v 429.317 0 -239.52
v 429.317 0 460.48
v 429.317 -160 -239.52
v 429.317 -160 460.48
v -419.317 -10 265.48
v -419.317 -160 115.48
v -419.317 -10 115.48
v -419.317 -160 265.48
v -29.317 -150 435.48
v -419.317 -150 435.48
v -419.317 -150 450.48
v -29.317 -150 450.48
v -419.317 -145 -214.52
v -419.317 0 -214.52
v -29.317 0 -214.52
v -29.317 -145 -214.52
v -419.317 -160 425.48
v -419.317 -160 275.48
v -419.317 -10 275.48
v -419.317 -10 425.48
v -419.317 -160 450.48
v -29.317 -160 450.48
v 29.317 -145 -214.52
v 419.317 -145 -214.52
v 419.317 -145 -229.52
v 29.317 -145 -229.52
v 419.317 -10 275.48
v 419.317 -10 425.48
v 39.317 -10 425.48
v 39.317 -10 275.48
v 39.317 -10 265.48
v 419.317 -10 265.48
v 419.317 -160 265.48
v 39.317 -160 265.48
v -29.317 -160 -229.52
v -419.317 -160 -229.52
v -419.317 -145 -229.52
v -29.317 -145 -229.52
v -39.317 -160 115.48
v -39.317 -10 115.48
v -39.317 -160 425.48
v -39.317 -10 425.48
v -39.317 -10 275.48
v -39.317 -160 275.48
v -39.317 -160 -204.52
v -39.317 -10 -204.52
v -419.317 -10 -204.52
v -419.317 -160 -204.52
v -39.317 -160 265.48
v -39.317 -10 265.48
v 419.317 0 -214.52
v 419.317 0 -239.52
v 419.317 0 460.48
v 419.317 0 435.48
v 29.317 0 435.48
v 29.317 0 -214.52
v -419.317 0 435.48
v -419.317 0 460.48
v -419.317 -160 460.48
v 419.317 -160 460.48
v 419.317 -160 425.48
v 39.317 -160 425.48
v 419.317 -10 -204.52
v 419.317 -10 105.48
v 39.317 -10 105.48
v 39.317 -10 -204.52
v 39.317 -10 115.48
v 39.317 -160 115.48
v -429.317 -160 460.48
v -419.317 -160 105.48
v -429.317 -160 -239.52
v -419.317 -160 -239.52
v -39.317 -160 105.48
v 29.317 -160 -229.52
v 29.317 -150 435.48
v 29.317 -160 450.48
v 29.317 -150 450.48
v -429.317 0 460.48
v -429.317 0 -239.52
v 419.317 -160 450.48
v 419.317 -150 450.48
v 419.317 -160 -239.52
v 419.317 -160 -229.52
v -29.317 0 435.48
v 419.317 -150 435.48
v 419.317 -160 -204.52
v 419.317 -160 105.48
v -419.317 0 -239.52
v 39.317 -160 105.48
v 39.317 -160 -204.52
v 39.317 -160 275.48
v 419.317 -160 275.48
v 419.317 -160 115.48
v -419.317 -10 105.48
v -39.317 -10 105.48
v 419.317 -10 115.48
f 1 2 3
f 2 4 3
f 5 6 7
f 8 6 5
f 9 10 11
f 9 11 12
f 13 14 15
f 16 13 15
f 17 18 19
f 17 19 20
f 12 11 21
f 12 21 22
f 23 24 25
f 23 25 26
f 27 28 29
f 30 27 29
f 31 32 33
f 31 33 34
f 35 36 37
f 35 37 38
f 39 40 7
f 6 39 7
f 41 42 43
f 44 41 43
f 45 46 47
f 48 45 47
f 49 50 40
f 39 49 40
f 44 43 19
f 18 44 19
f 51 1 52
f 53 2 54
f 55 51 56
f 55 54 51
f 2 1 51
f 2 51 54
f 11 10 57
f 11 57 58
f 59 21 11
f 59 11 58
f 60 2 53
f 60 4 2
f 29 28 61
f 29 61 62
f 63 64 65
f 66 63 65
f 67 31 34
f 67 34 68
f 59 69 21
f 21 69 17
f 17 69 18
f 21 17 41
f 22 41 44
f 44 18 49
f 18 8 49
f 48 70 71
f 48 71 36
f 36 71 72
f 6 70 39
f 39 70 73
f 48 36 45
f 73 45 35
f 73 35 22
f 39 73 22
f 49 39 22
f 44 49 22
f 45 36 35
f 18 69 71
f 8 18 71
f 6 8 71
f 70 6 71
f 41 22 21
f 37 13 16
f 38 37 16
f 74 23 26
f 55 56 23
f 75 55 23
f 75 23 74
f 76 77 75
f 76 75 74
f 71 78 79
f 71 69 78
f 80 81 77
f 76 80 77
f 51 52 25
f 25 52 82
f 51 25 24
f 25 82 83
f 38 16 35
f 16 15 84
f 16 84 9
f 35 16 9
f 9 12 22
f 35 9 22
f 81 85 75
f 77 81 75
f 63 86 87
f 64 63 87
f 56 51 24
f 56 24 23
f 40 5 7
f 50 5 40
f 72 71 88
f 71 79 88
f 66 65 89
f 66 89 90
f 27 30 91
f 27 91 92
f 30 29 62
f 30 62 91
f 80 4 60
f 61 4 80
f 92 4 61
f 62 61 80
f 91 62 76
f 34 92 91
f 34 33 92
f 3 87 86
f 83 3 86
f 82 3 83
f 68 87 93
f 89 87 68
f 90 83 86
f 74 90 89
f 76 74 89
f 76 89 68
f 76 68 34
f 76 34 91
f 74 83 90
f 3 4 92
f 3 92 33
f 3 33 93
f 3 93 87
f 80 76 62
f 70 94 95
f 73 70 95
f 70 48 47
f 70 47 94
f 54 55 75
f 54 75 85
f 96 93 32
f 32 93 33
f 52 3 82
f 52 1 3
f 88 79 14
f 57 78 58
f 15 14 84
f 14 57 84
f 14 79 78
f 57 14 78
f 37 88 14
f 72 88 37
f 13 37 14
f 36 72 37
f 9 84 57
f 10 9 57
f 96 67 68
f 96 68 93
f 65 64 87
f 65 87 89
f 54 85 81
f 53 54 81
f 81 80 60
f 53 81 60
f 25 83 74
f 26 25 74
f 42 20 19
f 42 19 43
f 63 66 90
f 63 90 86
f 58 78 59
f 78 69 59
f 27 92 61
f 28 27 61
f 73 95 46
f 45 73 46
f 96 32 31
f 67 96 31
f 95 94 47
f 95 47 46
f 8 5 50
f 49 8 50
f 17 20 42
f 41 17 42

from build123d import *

# Parameters (mm, degrees)
F0_W          = 400
F0_H          = 650
F1_DEPTH      = 10
F2_W          = 10
F2_H          = 25
F2_H_2        = 650
F3_DEPTH      = 150
F3_DEPTH_BACK = 10
F5_DEPTH      = 150
F6_W          = 390
F6_H          = 10
F7_DEPTH      = 15
F8_W          = 390
F8_H          = 15
F9_DEPTH      = 15


with BuildPart() as f1:
    # F0 (on Front) → F1 (new body)
    with BuildSketch(Plane.XZ):
        with Locations((-229.316539192, 110.4799643159)):
            Rectangle(F0_W, F0_H)
    extrude(amount=F1_DEPTH)

    # F2 (on face) → F3 (join, two sides)
    with BuildSketch(Plane.XZ.offset(10)) as f3_sk:
        with Locations((-424.316539192, 447.9799643159)):
            Rectangle(F2_W, F2_H)
        with Locations((-424.316539192, 110.4799643159)):
            Rectangle(F2_W, F2_H_2)
        with Locations((-424.316539192, -227.0200356841)):
            Rectangle(F2_W, F2_H)
    extrude(amount=F3_DEPTH)
    extrude(f3_sk.sketch, amount=-F3_DEPTH_BACK)

    # F4 (on face) → F5 (join)
    with BuildSketch(Plane.XZ.offset(10)):
        Polygon((-419.316539192, 435.4799643159), (-419.316539192, 425.4799643159), (-39.3165391921, 425.4799643159), (-39.316539192, 275.4799643159), (-419.316539192, 275.4799643159), (-419.316539192, 265.4799643159), (-39.3165391921, 265.4799643159), (-39.3165391921, 115.4799643159), (-419.316539192, 115.4799643159), (-419.316539192, 105.4799643159), (-39.316539192, 105.4799643159), (-39.316539192, -204.5200356841), (-419.316539192, -204.5200356841), (-419.316539192, -214.5200356841), (-29.316539192, -214.5200356841), (-29.316539192, 435.4799643159), align=None)
    extrude(amount=F5_DEPTH)

    # F6 (on face) → F7 (join)
    with BuildSketch(Plane.XY.offset(435.4799643159)):
        with Locations((-224.316539192, -155)):
            Rectangle(F6_W, F6_H)
    extrude(amount=F7_DEPTH)

    # F8 (on face) → F9 (join)
    with BuildSketch(Plane(origin=(0, 0, -214.5200356841), x_dir=(1, 0, 0), z_dir=(0, 0, -1))):
        with Locations((-224.316539192, 152.5)):
            Rectangle(F8_W, F8_H)
    extrude(amount=F9_DEPTH)


with BuildPart() as f10_1:
    # F10: instance of F1
    add(f1.part.mirror(Plane.YZ))


solid = Compound([f1.part, f10_1.part])
